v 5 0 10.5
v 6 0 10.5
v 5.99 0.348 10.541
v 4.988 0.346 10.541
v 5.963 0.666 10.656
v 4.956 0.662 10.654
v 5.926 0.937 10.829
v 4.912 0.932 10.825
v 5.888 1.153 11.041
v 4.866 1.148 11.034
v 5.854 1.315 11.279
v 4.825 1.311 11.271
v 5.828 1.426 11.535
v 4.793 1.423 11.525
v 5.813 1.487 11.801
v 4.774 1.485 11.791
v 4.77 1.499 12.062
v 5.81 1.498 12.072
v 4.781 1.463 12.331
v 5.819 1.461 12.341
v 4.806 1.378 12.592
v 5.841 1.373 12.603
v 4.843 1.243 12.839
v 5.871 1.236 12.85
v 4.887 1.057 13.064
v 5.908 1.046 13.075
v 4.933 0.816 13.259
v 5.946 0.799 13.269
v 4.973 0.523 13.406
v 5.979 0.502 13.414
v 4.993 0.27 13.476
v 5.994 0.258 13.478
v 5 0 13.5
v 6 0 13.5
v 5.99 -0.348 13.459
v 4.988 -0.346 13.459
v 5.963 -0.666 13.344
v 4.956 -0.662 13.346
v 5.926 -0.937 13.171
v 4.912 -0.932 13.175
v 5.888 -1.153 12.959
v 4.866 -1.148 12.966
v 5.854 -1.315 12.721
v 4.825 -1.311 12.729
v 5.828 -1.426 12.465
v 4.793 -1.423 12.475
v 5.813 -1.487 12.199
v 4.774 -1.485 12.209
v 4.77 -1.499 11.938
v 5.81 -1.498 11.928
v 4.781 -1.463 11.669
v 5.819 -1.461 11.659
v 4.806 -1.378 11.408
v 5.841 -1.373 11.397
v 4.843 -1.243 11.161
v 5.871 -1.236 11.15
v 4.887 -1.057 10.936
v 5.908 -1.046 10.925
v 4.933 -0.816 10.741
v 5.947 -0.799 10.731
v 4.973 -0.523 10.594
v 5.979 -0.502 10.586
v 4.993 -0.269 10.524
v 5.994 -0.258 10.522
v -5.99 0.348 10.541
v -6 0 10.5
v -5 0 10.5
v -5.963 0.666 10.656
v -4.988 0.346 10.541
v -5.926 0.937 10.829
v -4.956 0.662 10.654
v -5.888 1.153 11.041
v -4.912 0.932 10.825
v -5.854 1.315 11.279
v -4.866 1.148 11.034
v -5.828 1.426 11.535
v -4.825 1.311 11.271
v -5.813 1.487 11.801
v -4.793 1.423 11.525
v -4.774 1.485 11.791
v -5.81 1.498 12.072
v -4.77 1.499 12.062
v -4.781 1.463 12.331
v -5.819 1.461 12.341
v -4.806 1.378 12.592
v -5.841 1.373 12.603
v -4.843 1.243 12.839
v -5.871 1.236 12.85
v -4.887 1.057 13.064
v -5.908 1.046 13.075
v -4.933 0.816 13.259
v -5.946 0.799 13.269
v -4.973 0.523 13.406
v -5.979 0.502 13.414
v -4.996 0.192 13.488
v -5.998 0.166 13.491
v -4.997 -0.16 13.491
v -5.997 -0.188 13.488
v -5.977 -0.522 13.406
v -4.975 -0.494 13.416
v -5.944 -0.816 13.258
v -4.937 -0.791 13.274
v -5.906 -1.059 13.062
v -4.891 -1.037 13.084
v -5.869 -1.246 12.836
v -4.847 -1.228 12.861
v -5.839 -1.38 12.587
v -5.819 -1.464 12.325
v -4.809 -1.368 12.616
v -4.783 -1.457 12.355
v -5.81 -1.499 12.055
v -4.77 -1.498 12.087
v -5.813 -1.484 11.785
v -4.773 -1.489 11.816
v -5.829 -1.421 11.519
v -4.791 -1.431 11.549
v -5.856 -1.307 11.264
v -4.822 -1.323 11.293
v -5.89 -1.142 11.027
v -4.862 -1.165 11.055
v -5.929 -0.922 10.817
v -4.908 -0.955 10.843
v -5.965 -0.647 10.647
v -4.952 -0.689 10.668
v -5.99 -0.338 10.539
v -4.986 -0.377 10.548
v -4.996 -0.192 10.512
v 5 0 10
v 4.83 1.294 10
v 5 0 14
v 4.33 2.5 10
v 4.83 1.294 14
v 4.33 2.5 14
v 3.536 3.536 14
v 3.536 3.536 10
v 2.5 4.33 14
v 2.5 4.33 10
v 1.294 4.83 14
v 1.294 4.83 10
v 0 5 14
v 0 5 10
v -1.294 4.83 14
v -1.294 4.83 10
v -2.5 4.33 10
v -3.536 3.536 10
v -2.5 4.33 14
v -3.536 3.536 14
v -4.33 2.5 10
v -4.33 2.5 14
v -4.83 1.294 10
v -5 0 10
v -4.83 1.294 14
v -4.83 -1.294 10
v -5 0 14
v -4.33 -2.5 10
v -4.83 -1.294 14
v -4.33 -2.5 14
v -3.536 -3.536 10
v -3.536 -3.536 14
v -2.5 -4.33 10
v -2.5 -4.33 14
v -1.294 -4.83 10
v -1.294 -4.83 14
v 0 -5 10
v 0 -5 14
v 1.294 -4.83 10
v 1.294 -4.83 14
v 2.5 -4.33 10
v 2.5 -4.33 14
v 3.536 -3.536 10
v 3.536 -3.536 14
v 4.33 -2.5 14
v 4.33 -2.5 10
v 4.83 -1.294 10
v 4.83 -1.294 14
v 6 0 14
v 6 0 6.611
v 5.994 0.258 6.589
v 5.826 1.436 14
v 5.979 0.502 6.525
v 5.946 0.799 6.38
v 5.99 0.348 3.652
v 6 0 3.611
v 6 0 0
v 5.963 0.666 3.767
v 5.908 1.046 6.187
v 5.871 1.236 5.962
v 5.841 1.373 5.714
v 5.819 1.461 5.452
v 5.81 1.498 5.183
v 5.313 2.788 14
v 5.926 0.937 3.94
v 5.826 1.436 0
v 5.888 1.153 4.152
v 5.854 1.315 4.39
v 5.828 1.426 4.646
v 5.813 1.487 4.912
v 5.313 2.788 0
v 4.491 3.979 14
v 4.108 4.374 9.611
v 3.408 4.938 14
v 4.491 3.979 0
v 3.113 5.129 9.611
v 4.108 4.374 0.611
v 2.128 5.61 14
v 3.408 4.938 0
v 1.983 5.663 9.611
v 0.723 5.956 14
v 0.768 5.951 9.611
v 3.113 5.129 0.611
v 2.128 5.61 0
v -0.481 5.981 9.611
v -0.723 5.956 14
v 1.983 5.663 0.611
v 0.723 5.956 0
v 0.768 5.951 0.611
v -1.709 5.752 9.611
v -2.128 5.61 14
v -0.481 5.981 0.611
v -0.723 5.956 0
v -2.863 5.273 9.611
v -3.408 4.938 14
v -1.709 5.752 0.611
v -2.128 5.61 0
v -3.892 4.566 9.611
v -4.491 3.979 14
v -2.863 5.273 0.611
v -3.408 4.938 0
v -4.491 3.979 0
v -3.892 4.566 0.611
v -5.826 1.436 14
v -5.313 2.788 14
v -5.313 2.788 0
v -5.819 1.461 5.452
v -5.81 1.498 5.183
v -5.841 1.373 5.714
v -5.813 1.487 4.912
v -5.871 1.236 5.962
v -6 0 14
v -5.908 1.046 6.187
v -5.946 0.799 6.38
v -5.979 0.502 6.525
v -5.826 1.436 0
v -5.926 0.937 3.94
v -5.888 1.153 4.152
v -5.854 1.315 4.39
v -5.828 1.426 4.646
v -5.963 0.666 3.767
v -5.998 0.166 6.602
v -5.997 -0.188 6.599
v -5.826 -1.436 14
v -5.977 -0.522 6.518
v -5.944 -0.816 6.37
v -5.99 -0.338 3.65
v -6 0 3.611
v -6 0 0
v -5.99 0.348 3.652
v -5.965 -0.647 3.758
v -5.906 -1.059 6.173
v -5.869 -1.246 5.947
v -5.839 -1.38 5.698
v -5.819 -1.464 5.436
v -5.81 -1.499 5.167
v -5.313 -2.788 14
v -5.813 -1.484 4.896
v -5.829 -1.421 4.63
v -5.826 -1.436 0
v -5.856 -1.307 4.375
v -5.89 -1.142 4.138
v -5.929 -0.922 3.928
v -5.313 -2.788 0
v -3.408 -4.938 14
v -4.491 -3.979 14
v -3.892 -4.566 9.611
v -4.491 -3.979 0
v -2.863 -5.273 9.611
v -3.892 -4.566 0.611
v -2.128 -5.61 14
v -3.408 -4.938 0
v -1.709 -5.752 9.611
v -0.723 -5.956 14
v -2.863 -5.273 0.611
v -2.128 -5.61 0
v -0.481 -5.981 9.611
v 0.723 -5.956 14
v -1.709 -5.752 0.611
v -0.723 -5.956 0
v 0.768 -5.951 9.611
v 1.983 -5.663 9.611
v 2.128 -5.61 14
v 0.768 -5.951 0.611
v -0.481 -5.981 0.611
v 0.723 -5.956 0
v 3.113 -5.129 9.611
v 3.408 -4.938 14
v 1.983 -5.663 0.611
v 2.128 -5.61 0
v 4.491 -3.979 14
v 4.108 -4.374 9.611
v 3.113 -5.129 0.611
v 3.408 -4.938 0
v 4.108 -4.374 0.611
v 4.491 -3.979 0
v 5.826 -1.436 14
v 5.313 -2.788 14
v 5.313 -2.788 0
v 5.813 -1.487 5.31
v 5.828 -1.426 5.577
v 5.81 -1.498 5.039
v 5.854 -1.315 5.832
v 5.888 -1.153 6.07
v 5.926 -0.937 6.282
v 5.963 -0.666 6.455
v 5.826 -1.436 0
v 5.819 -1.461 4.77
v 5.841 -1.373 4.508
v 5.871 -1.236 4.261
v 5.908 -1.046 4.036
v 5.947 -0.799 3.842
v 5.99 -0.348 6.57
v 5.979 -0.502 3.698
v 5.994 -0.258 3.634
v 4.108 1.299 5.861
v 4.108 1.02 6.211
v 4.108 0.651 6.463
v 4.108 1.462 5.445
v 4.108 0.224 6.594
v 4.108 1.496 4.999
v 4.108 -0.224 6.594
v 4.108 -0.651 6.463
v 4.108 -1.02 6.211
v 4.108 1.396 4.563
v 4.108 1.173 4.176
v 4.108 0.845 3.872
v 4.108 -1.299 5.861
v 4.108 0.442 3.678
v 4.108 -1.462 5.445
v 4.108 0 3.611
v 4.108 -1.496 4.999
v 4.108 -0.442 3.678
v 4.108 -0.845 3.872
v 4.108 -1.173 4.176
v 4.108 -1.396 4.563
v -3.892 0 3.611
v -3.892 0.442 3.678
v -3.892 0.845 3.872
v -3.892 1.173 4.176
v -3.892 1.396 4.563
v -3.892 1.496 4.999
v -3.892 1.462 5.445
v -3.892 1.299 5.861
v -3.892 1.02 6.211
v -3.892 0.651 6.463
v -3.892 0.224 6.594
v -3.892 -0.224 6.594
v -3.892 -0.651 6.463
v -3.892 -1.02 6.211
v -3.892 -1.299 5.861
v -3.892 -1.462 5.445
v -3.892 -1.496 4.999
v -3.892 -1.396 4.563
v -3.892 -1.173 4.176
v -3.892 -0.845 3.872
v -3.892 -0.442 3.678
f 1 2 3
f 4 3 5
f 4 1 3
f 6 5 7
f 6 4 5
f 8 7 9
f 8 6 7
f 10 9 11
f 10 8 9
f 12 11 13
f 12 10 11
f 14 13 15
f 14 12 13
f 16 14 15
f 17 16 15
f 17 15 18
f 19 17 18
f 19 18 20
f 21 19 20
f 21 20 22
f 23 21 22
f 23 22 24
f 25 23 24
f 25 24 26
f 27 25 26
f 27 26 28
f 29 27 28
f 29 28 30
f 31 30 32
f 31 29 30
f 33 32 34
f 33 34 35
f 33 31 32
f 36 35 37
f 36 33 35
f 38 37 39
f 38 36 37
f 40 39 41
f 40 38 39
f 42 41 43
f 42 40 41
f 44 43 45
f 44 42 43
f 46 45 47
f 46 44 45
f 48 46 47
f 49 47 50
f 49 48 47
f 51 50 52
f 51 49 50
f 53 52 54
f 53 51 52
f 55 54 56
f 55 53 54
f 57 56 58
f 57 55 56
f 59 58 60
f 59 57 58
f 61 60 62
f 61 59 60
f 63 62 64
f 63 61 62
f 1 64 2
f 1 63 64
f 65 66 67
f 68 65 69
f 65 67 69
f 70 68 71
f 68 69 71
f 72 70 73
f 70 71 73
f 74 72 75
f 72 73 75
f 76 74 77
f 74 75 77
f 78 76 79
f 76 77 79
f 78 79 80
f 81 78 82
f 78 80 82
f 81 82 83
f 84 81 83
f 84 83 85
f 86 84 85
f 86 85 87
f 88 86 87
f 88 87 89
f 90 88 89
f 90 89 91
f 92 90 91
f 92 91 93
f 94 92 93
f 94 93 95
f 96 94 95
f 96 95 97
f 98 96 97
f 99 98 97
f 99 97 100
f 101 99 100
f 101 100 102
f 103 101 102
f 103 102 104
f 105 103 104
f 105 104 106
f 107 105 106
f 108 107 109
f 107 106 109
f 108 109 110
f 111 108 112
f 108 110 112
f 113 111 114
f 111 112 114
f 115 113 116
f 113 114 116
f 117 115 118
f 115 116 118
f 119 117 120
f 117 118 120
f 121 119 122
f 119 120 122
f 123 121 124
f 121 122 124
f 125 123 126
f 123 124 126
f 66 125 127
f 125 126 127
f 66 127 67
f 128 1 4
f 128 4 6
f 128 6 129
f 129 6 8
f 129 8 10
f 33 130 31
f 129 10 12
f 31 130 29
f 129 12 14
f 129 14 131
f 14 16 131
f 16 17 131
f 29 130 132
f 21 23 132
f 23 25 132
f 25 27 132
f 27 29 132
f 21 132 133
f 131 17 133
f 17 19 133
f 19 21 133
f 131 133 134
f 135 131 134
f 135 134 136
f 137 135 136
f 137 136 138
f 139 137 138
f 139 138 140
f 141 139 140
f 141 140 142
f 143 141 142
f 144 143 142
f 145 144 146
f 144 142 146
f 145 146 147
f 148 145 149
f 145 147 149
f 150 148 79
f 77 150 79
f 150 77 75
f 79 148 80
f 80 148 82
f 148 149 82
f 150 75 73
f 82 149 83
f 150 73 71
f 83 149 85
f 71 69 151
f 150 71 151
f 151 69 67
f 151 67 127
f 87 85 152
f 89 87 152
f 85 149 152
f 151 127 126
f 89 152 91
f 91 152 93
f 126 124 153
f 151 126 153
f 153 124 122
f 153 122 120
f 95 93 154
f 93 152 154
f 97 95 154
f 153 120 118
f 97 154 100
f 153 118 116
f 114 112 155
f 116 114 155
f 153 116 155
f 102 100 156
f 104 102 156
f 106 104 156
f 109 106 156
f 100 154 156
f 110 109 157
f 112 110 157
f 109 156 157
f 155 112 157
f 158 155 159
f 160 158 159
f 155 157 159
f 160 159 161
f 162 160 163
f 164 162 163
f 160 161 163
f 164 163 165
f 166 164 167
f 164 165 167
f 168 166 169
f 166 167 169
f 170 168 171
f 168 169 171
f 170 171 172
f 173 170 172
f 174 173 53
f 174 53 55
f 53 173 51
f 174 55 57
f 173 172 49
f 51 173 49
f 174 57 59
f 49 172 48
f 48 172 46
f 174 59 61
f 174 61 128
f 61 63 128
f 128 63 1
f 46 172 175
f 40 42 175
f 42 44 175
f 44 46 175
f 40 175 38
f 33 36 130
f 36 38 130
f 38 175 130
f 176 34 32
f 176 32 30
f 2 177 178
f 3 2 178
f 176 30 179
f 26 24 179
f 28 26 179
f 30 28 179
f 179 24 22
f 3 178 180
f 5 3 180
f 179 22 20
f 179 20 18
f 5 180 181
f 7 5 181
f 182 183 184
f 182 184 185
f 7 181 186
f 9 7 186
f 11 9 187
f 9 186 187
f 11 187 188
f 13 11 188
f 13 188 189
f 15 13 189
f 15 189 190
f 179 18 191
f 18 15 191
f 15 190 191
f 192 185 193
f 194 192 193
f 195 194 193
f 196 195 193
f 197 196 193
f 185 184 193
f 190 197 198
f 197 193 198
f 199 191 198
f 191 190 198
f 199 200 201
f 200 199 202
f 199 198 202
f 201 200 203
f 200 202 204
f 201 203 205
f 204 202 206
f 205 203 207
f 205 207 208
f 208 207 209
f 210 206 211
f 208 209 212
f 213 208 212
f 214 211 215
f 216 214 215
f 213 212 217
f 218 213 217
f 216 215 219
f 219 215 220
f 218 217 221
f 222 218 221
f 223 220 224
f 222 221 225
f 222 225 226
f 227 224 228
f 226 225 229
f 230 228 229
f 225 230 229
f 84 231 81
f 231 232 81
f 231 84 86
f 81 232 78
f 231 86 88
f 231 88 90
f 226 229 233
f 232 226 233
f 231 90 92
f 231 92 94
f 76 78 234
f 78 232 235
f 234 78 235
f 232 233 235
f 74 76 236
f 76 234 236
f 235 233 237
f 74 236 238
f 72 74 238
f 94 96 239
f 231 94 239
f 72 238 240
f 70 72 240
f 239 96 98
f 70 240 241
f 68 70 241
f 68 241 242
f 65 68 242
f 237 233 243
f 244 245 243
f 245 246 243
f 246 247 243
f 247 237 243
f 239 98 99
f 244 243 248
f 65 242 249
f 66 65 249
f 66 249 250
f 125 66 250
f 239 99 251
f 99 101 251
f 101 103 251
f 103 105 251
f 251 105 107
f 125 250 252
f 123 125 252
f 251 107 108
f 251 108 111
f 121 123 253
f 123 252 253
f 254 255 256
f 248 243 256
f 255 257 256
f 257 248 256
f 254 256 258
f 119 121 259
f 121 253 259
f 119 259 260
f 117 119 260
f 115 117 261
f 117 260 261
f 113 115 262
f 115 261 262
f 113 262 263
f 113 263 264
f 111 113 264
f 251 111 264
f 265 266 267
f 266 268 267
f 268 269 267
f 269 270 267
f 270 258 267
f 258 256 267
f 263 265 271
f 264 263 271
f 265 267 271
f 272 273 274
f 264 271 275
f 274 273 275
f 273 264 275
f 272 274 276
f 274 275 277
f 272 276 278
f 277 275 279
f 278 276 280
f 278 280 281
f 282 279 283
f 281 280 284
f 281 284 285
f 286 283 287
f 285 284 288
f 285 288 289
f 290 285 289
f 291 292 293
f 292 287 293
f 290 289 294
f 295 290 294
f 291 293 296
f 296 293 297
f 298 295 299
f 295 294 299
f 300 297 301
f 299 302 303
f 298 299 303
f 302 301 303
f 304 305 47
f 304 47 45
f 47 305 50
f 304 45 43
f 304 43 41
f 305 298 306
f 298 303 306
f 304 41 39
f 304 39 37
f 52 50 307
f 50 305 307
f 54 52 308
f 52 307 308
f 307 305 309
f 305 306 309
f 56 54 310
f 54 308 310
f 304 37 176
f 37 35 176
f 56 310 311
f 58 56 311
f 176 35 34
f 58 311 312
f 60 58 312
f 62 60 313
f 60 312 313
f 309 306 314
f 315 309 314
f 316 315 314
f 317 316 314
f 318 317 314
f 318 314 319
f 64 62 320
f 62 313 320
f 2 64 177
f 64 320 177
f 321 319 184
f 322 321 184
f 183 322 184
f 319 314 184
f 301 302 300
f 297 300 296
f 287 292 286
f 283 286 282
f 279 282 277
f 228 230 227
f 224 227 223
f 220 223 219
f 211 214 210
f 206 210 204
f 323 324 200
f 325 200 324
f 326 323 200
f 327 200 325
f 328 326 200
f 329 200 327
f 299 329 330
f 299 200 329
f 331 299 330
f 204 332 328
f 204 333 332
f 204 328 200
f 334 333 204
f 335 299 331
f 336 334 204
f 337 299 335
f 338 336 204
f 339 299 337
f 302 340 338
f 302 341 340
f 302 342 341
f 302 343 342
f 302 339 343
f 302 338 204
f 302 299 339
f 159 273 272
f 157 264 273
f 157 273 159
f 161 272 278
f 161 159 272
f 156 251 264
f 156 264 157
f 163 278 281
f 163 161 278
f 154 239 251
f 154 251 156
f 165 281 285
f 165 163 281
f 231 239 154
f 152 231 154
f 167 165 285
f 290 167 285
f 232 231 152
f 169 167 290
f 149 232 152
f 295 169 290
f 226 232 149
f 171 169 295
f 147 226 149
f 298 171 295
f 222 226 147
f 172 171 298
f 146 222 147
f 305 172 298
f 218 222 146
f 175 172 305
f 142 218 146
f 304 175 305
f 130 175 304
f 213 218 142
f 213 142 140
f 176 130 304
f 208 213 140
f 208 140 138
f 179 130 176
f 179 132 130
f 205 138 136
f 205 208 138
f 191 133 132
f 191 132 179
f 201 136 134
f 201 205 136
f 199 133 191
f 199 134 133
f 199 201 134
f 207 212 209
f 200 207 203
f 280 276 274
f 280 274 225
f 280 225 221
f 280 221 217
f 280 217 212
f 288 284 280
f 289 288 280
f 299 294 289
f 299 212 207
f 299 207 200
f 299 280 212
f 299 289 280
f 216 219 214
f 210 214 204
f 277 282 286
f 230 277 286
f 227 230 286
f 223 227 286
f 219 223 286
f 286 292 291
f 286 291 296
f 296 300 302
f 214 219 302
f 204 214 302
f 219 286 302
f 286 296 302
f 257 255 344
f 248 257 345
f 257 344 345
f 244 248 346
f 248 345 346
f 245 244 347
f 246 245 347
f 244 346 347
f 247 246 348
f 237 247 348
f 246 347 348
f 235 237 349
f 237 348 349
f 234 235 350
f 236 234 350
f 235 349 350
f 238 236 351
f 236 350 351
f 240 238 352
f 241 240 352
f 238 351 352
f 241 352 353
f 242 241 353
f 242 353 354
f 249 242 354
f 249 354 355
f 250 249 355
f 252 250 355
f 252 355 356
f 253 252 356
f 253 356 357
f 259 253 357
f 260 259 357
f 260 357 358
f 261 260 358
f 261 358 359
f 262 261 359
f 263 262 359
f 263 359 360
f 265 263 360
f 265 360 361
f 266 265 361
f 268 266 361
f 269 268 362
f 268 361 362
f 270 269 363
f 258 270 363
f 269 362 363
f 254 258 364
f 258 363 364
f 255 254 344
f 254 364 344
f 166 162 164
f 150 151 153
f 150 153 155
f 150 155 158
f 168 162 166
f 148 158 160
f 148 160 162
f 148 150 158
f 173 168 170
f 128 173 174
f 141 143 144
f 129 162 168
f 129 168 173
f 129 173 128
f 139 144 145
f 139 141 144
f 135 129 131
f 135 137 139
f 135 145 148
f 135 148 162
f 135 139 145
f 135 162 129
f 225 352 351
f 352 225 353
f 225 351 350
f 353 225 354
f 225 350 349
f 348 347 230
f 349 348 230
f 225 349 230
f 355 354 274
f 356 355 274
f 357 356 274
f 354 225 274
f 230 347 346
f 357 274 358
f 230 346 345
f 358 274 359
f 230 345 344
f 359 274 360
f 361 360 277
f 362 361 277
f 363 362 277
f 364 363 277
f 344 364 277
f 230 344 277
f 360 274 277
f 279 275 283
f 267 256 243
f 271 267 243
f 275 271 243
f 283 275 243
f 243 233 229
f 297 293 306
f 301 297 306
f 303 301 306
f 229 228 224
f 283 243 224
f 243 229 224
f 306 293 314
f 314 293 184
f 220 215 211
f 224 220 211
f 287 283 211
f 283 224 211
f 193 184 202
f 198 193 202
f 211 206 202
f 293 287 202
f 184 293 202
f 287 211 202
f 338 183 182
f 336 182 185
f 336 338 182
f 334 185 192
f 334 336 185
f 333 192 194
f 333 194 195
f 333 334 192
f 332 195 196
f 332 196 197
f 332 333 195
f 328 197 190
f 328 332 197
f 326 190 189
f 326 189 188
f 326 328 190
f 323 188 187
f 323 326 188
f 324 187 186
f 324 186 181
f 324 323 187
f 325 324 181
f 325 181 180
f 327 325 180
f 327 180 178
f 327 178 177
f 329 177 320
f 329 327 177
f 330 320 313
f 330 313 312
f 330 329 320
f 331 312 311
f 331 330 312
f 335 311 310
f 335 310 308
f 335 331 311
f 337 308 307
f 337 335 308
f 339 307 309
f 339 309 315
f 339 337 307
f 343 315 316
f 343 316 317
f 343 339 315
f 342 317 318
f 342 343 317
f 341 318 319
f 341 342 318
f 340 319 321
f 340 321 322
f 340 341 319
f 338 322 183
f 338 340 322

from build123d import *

# Parameters (mm, degrees)
SKETCH2_R               = 6
BOSS_EXTRUDE1_DEPTH     = 14
SKETCH3_R               = 5
CUT_EXTRUDE1_DEPTH      = 4
SKETCH4_R               = 1.5
CUT_EXTRUDE2_DEPTH      = 7
CUT_EXTRUDE2_DEPTH_BACK = 7
SKETCH7_W               = 8
SKETCH7_H               = 9
CUT_EXTRUDE5_DEPTH      = 7.0000001
CUT_EXTRUDE5_DEPTH_BACK = 7.0000001
SKETCH8_R               = 1.5
CUT_EXTRUDE6_DEPTH      = 7.0000001
CUT_EXTRUDE6_DEPTH_BACK = 7.0000001


with BuildPart() as part:
    # Sketch2 → Boss-Extrude1 (new body)
    with BuildSketch(Plane.XY):
        Circle(SKETCH2_R)
    extrude(amount=BOSS_EXTRUDE1_DEPTH)

    # Sketch3 → Cut-Extrude1 (cut)
    with BuildSketch(Plane.XY.offset(14)):
        Circle(SKETCH3_R)
    extrude(amount=-CUT_EXTRUDE1_DEPTH, mode=Mode.SUBTRACT)

    # Sketch4 → Cut-Extrude2 (cut, two sides)
    with BuildSketch(Plane(origin=(0, 0, 0), x_dir=(0, 0, -1), z_dir=(1, 0, 0))) as cut_extrude2_sk:
        with Locations((-12, 0)):
            Circle(SKETCH4_R)
    extrude(amount=CUT_EXTRUDE2_DEPTH, mode=Mode.SUBTRACT)
    extrude(cut_extrude2_sk.sketch, amount=-CUT_EXTRUDE2_DEPTH_BACK, mode=Mode.SUBTRACT)

    # Sketch7 → Cut-Extrude5 (cut, two sides)
    with BuildSketch(Plane(origin=(0, 0, 0), x_dir=(1, 0, 0), z_dir=(0, 1, 0))) as cut_extrude5_sk:
        with Locations((0.10757358, -5.111243205)):
            Rectangle(SKETCH7_W, SKETCH7_H)
    extrude(amount=CUT_EXTRUDE5_DEPTH, mode=Mode.SUBTRACT)
    extrude(cut_extrude5_sk.sketch, amount=-CUT_EXTRUDE5_DEPTH_BACK, mode=Mode.SUBTRACT)

    # Sketch8 → Cut-Extrude6 (cut, two sides)
    with BuildSketch(Plane(origin=(0, 0, 0), x_dir=(0, 0, -1), z_dir=(1, 0, 0))) as cut_extrude6_sk:
        with Locations((-5.111243205, 0)):
            Circle(SKETCH8_R)
    extrude(amount=CUT_EXTRUDE6_DEPTH, mode=Mode.SUBTRACT)
    extrude(cut_extrude6_sk.sketch, amount=-CUT_EXTRUDE6_DEPTH_BACK, mode=Mode.SUBTRACT)


solid = part.part
